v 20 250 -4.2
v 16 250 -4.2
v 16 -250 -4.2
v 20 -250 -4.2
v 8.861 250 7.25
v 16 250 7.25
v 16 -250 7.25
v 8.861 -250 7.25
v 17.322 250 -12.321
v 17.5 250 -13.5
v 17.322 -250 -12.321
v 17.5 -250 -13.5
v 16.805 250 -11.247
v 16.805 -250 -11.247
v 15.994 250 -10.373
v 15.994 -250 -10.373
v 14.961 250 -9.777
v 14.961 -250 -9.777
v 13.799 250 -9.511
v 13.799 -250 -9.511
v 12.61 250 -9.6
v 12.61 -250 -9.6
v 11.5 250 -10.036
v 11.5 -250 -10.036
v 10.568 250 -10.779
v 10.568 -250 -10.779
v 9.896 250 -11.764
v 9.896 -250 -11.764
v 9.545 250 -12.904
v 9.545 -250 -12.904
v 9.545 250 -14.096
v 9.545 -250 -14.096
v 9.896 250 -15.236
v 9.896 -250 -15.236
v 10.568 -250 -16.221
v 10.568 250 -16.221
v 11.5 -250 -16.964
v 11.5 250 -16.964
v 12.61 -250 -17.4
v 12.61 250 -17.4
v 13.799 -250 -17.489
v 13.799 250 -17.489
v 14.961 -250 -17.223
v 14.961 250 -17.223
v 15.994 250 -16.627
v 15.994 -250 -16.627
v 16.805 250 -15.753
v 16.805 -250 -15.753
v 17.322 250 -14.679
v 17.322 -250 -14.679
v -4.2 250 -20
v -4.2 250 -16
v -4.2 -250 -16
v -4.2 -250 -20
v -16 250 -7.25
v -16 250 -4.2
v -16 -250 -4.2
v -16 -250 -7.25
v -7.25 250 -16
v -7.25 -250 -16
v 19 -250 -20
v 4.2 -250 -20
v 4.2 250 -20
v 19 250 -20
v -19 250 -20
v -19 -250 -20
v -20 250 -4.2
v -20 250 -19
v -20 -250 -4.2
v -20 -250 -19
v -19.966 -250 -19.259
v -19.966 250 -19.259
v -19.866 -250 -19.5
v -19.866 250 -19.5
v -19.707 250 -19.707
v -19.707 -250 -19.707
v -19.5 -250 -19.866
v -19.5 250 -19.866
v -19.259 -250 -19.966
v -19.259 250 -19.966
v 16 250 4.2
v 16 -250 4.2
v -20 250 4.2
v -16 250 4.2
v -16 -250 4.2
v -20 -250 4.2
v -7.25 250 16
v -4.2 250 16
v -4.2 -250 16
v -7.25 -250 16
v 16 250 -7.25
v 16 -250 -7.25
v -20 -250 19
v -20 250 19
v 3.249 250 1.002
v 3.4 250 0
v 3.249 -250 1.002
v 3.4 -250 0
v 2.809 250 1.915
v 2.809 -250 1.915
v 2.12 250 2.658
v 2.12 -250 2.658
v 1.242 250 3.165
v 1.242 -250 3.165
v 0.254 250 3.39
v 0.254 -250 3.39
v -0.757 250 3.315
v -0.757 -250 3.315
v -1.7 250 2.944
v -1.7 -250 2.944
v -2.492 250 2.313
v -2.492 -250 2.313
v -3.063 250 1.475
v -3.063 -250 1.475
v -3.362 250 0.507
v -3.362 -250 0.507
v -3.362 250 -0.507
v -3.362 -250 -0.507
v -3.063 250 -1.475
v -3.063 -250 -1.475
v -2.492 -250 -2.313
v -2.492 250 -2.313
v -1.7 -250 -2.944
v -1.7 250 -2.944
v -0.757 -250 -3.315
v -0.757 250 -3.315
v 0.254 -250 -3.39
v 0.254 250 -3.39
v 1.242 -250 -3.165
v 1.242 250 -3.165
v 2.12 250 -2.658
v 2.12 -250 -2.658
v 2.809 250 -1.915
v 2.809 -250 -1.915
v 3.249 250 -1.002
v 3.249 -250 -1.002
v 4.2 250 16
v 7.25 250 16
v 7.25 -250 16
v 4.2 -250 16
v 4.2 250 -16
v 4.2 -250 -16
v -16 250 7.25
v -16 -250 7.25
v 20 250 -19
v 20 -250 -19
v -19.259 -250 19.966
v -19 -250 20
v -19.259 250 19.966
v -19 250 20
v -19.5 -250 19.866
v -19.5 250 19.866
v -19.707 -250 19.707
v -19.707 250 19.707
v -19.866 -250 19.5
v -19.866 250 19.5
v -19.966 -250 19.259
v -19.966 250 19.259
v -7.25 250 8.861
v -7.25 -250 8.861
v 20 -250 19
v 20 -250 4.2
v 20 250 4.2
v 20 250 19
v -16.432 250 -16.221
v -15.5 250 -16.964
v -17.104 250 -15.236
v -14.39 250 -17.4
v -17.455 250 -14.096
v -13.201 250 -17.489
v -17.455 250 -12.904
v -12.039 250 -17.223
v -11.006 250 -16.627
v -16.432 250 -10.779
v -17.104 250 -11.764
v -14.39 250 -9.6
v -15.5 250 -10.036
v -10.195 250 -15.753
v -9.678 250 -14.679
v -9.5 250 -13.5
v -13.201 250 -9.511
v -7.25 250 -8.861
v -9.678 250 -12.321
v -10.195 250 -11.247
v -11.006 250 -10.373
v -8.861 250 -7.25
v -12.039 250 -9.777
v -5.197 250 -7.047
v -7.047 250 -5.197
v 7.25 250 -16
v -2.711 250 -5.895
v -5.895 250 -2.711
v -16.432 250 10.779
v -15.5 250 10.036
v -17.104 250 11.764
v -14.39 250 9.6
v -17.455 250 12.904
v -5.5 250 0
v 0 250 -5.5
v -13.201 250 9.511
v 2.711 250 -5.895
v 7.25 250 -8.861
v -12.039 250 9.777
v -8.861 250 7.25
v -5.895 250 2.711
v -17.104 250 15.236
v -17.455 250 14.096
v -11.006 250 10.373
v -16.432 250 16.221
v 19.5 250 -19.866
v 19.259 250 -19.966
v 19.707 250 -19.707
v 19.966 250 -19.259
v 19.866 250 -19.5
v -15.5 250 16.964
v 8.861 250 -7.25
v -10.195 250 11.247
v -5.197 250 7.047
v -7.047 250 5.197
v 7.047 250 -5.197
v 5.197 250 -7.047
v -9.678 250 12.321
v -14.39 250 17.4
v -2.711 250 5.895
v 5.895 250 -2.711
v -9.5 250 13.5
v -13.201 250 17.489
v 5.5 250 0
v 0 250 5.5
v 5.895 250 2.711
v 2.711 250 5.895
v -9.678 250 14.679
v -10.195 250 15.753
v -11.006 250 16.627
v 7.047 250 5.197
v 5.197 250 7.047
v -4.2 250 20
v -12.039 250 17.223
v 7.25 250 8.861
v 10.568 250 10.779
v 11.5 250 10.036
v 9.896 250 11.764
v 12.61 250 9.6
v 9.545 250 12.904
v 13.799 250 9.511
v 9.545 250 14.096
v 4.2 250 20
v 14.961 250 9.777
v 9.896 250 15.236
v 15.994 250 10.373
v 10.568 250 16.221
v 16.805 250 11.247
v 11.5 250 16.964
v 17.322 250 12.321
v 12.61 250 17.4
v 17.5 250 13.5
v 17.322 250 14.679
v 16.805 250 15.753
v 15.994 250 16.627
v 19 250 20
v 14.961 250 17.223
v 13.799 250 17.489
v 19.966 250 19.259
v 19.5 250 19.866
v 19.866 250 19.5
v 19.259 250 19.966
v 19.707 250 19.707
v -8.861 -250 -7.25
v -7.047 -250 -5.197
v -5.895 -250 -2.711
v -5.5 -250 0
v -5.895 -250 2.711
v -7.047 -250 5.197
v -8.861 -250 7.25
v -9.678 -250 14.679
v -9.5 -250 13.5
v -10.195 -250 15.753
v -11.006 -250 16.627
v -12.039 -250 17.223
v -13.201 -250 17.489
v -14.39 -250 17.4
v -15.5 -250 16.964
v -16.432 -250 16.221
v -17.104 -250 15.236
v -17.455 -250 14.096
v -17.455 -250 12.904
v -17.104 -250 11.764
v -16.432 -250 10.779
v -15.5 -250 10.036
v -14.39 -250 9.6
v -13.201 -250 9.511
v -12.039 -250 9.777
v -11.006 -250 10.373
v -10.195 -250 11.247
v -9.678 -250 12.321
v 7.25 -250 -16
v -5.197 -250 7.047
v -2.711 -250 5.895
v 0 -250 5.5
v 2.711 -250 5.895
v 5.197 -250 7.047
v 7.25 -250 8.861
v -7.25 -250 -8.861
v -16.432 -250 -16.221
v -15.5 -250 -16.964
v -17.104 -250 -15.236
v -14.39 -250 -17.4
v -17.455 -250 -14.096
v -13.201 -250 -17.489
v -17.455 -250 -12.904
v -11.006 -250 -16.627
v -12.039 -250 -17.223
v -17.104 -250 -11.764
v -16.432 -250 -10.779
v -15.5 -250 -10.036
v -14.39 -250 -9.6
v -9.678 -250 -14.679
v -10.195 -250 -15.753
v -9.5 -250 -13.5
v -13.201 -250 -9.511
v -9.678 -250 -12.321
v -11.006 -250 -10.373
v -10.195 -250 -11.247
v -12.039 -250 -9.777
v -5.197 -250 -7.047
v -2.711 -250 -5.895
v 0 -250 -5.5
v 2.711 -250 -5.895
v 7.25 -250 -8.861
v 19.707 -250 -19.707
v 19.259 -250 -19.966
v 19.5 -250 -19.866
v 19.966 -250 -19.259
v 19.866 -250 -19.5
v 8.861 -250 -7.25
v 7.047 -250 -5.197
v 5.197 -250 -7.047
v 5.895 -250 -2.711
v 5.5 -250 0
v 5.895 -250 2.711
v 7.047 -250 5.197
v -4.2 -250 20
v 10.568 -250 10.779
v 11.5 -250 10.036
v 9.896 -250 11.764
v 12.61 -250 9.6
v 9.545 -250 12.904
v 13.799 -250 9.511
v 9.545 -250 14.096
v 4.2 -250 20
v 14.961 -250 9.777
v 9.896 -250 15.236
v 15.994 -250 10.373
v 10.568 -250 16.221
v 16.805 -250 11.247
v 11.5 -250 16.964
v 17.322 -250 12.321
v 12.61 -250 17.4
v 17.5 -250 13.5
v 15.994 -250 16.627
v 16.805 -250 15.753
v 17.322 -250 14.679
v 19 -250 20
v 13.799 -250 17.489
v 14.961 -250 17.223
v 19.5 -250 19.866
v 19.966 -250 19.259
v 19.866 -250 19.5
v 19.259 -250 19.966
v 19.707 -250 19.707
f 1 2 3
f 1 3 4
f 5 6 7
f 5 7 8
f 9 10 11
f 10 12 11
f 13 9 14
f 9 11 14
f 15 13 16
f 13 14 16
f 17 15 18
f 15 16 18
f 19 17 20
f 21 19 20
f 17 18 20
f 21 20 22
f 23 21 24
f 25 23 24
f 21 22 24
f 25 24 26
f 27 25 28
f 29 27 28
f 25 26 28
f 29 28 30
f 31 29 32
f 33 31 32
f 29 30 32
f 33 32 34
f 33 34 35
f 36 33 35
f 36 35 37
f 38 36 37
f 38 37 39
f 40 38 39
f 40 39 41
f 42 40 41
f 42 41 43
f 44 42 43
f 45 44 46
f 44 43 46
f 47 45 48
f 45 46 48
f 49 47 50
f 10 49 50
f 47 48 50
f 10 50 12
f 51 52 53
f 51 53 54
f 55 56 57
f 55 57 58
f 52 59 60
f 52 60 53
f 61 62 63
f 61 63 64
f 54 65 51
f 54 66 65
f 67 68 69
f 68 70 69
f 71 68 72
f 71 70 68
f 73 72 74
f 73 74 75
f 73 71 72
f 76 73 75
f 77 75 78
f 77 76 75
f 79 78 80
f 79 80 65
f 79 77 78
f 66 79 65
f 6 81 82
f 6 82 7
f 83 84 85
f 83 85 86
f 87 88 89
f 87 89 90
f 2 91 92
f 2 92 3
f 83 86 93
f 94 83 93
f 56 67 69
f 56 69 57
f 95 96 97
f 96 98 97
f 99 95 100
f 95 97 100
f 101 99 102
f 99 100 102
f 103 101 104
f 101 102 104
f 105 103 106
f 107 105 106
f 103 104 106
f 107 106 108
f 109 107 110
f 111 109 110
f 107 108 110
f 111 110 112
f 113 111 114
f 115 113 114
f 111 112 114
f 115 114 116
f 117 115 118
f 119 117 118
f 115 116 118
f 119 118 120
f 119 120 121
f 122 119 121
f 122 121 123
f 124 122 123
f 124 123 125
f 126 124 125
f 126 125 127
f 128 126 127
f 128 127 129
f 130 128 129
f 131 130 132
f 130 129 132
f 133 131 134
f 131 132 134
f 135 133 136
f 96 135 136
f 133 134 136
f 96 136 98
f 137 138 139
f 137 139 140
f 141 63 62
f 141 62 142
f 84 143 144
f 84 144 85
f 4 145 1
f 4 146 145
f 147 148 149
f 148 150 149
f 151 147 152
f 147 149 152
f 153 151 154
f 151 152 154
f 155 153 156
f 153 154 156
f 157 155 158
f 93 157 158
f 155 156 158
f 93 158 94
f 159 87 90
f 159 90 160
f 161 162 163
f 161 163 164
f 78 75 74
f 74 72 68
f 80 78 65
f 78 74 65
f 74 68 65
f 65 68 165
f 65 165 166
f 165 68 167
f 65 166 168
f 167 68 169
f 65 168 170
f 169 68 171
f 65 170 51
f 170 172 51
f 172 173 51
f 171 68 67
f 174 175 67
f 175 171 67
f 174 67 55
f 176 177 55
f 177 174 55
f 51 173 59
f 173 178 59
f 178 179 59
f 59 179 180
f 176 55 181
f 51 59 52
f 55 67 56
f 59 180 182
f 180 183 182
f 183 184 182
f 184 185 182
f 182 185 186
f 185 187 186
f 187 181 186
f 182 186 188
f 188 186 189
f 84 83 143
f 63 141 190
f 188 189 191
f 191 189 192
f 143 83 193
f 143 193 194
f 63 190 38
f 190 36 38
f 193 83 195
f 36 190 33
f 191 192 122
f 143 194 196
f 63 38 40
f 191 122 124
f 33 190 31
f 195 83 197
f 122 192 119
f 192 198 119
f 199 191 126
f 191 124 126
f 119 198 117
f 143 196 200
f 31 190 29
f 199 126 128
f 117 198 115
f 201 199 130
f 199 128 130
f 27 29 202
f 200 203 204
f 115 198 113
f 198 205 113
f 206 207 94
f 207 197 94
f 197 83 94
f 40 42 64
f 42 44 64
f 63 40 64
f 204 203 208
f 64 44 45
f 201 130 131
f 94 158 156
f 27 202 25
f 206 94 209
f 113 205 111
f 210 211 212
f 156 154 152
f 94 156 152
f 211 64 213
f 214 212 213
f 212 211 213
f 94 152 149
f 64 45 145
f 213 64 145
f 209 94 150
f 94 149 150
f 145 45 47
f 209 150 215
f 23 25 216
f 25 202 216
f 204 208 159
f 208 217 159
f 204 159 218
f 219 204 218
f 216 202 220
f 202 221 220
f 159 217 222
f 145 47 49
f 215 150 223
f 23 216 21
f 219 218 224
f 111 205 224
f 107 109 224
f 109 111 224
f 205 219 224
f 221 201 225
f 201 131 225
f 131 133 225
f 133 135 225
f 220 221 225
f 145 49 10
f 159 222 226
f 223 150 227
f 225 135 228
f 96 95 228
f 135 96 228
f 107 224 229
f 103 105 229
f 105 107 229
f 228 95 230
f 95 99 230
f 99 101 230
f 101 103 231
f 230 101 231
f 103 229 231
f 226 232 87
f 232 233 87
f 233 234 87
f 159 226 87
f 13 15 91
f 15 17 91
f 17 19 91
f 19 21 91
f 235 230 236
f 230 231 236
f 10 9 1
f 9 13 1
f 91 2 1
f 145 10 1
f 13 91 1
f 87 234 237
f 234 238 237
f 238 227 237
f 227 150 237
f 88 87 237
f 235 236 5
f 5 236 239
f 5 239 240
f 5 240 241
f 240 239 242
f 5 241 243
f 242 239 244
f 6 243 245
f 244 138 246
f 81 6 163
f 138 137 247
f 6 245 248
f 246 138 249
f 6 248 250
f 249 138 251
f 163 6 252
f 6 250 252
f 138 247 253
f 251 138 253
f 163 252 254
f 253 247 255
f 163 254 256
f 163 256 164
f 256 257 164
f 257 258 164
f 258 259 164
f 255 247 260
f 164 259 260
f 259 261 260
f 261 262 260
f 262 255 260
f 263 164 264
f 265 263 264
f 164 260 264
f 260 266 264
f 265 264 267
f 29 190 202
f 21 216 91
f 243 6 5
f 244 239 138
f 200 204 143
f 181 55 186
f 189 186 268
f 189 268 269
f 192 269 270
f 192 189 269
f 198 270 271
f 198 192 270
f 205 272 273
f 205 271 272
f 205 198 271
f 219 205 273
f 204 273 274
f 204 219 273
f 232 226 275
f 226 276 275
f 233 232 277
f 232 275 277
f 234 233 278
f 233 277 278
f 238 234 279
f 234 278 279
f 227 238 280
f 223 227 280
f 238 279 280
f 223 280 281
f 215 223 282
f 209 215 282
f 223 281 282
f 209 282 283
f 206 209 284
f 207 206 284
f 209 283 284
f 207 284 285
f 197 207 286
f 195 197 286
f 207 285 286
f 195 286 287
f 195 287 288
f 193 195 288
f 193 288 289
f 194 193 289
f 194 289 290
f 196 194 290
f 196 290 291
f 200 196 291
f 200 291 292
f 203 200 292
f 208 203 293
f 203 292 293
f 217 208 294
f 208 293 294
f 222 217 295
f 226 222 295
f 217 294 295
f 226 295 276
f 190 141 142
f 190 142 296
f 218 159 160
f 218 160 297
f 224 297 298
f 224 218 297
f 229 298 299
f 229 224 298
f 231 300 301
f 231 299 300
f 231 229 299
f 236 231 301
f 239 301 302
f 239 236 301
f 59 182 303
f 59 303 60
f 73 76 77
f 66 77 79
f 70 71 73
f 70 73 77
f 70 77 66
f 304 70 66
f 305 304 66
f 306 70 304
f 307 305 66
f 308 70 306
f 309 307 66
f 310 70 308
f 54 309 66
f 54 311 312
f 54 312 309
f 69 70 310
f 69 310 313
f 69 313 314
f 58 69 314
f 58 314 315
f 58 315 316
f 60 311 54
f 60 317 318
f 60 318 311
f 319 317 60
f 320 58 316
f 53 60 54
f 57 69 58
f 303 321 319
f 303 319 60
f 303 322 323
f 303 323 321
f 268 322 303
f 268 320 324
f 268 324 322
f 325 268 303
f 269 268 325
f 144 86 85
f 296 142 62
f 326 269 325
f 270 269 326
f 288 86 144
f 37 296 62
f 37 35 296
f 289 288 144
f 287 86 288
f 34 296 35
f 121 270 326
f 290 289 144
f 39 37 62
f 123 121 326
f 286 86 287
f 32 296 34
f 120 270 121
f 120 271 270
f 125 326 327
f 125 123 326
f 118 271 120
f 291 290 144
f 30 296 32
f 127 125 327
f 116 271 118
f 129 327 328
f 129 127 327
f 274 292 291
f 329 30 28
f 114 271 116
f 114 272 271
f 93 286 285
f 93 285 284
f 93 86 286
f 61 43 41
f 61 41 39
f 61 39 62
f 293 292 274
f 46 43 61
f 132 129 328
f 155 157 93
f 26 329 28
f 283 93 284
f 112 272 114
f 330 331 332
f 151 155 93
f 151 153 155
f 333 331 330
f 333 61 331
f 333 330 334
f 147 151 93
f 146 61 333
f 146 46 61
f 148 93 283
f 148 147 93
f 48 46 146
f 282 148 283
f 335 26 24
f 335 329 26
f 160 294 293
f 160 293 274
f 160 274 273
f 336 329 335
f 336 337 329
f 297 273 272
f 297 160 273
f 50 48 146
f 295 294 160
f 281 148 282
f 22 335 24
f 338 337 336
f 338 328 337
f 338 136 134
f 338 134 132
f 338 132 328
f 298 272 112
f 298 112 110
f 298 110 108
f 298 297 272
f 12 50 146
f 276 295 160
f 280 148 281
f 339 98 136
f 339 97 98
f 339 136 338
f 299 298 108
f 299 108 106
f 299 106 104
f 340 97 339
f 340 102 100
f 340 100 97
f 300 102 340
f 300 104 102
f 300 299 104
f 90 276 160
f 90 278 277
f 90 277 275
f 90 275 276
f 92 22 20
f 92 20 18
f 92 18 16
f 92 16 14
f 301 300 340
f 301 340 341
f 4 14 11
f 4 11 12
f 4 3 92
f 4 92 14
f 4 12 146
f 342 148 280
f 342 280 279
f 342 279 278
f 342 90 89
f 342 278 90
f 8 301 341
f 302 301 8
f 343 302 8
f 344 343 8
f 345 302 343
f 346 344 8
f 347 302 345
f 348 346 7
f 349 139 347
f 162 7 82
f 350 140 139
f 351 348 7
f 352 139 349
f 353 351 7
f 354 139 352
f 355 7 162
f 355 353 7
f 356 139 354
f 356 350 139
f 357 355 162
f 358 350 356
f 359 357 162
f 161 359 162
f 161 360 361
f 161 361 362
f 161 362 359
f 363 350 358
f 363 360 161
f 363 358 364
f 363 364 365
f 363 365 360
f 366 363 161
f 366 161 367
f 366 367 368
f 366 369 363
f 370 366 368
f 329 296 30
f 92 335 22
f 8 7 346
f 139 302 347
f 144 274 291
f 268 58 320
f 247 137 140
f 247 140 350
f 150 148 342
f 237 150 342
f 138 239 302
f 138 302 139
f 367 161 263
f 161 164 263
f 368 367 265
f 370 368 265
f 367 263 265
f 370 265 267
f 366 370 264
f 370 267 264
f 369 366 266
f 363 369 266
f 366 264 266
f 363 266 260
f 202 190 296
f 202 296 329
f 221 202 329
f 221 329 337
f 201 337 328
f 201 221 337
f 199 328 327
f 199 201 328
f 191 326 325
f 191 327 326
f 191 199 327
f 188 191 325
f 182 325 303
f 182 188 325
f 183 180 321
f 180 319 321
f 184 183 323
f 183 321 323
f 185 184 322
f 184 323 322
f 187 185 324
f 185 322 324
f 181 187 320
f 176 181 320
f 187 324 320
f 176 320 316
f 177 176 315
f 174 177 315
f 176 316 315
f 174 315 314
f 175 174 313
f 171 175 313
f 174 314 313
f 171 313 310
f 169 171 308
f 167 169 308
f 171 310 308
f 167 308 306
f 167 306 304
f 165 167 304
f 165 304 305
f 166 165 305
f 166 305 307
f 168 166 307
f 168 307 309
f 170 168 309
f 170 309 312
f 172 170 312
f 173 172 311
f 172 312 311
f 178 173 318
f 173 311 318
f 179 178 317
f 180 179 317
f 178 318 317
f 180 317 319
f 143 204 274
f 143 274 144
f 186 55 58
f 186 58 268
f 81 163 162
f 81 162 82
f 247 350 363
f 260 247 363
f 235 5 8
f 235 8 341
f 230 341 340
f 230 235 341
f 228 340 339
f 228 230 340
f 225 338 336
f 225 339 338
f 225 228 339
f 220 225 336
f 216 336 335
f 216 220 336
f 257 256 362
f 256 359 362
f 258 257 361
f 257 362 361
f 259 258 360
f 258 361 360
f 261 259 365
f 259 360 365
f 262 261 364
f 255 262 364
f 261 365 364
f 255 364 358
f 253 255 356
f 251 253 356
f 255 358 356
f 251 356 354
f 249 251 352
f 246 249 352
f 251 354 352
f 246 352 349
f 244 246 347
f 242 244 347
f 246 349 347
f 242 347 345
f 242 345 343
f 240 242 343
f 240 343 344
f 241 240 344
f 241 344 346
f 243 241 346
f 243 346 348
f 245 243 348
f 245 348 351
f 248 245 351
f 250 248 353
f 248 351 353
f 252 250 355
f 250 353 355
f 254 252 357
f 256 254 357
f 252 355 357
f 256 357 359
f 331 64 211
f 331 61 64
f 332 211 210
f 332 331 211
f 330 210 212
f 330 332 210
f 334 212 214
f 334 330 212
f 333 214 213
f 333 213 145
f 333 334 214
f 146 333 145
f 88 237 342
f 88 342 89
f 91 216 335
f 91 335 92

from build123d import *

# Parameters (mm, degrees)
F1_W          = 40
F1_H          = 40
F2_DEPTH      = 250
F3_R          = 4
F3_R_2        = 3.4
F4_DEPTH      = 250.001
F4_DEPTH_BACK = 250.001
F6_DEPTH      = 250.001
F6_DEPTH_BACK = 250.001
F7_R          = 1


with BuildPart() as f2:
    # F1 (on Front) → F2 (new body, symmetric)
    with BuildSketch(Plane.XZ):
        Rectangle(F1_W, F1_H)
    extrude(amount=F2_DEPTH, both=True)

    # F3 (on Front) → F4 (cut, two sides)
    with BuildSketch(Plane.XZ) as f4_sk:
        with Locations((-13.5, 13.5)):
            Circle(F3_R)
        with Locations((-13.5, -13.5)):
            Circle(F3_R)
        with Locations((13.5, -13.5)):
            Circle(F3_R)
        with Locations((13.5, 13.5)):
            Circle(F3_R)
        Circle(F3_R_2)
    extrude(amount=-F4_DEPTH, mode=Mode.SUBTRACT)
    extrude(f4_sk.sketch, amount=F4_DEPTH_BACK, mode=Mode.SUBTRACT)

    # F5 (on Front) → F6 (cut, two sides)
    with BuildSketch(Plane.XZ) as f6_sk:
        with BuildLine():
            Line((4.2, 20), (-4.2, 20))
            Line((-4.2, 20), (-4.2, 16))
            Line((-4.2, 16), (-7.25, 16))
            Line((-7.25, 16), (-7.25, 8.8609854211))
            ThreePointArc((-7.25, 8.8609854211), (0, 5.5), (7.25, 8.8609854211))
            Line((7.25, 8.8609854211), (7.25, 16))
            Line((7.25, 16), (4.2, 16))
            Line((4.2, 16), (4.2, 20))
        make_face()
        with BuildLine():
            Line((-16, 7.25), (-16, 4.2))
            Line((-16, 4.2), (-20, 4.2))
            Line((-20, 4.2), (-20, -4.2))
            Line((-20, -4.2), (-16, -4.2))
            Line((-16, -4.2), (-16, -7.25))
            Line((-16, -7.25), (-8.8609854211, -7.25))
            ThreePointArc((-8.8609854211, -7.25), (-5.5, 0), (-8.8609854211, 7.25))
            Line((-8.8609854211, 7.25), (-16, 7.25))
        make_face()
        with BuildLine():
            Line((-7.25, -16), (-4.2, -16))
            Line((-4.2, -16), (-4.2, -20))
            Line((-4.2, -20), (4.2, -20))
            Line((4.2, -20), (4.2, -16))
            Line((4.2, -16), (7.25, -16))
            Line((7.25, -16), (7.25, -8.8609854211))
            ThreePointArc((7.25, -8.8609854211), (0, -5.5), (-7.25, -8.8609854211))
            Line((-7.25, -8.8609854211), (-7.25, -16))
        make_face()
        with BuildLine():
            Line((16, -7.25), (16, -4.2))
            Line((16, -4.2), (20, -4.2))
            Line((20, -4.2), (20, 4.2))
            Line((20, 4.2), (16, 4.2))
            Line((16, 4.2), (16, 7.25))
            Line((16, 7.25), (8.8609854211, 7.25))
            ThreePointArc((8.8609854211, 7.25), (5.5, 0), (8.8609854211, -7.25))
            Line((8.8609854211, -7.25), (16, -7.25))
        make_face()
    extrude(amount=-F6_DEPTH, mode=Mode.SUBTRACT)
    extrude(f6_sk.sketch, amount=F6_DEPTH_BACK, mode=Mode.SUBTRACT)

    # F7
    f7_edges = [f2.edges().sort_by_distance(p)[0] for p in [
        (-20, 0, 20),
        (20, 0, 20),
        (20, 0, -20),
        (-20, 0, -20),
    ]]
    fillet(f7_edges, radius=F7_R)


solid = f2.part
